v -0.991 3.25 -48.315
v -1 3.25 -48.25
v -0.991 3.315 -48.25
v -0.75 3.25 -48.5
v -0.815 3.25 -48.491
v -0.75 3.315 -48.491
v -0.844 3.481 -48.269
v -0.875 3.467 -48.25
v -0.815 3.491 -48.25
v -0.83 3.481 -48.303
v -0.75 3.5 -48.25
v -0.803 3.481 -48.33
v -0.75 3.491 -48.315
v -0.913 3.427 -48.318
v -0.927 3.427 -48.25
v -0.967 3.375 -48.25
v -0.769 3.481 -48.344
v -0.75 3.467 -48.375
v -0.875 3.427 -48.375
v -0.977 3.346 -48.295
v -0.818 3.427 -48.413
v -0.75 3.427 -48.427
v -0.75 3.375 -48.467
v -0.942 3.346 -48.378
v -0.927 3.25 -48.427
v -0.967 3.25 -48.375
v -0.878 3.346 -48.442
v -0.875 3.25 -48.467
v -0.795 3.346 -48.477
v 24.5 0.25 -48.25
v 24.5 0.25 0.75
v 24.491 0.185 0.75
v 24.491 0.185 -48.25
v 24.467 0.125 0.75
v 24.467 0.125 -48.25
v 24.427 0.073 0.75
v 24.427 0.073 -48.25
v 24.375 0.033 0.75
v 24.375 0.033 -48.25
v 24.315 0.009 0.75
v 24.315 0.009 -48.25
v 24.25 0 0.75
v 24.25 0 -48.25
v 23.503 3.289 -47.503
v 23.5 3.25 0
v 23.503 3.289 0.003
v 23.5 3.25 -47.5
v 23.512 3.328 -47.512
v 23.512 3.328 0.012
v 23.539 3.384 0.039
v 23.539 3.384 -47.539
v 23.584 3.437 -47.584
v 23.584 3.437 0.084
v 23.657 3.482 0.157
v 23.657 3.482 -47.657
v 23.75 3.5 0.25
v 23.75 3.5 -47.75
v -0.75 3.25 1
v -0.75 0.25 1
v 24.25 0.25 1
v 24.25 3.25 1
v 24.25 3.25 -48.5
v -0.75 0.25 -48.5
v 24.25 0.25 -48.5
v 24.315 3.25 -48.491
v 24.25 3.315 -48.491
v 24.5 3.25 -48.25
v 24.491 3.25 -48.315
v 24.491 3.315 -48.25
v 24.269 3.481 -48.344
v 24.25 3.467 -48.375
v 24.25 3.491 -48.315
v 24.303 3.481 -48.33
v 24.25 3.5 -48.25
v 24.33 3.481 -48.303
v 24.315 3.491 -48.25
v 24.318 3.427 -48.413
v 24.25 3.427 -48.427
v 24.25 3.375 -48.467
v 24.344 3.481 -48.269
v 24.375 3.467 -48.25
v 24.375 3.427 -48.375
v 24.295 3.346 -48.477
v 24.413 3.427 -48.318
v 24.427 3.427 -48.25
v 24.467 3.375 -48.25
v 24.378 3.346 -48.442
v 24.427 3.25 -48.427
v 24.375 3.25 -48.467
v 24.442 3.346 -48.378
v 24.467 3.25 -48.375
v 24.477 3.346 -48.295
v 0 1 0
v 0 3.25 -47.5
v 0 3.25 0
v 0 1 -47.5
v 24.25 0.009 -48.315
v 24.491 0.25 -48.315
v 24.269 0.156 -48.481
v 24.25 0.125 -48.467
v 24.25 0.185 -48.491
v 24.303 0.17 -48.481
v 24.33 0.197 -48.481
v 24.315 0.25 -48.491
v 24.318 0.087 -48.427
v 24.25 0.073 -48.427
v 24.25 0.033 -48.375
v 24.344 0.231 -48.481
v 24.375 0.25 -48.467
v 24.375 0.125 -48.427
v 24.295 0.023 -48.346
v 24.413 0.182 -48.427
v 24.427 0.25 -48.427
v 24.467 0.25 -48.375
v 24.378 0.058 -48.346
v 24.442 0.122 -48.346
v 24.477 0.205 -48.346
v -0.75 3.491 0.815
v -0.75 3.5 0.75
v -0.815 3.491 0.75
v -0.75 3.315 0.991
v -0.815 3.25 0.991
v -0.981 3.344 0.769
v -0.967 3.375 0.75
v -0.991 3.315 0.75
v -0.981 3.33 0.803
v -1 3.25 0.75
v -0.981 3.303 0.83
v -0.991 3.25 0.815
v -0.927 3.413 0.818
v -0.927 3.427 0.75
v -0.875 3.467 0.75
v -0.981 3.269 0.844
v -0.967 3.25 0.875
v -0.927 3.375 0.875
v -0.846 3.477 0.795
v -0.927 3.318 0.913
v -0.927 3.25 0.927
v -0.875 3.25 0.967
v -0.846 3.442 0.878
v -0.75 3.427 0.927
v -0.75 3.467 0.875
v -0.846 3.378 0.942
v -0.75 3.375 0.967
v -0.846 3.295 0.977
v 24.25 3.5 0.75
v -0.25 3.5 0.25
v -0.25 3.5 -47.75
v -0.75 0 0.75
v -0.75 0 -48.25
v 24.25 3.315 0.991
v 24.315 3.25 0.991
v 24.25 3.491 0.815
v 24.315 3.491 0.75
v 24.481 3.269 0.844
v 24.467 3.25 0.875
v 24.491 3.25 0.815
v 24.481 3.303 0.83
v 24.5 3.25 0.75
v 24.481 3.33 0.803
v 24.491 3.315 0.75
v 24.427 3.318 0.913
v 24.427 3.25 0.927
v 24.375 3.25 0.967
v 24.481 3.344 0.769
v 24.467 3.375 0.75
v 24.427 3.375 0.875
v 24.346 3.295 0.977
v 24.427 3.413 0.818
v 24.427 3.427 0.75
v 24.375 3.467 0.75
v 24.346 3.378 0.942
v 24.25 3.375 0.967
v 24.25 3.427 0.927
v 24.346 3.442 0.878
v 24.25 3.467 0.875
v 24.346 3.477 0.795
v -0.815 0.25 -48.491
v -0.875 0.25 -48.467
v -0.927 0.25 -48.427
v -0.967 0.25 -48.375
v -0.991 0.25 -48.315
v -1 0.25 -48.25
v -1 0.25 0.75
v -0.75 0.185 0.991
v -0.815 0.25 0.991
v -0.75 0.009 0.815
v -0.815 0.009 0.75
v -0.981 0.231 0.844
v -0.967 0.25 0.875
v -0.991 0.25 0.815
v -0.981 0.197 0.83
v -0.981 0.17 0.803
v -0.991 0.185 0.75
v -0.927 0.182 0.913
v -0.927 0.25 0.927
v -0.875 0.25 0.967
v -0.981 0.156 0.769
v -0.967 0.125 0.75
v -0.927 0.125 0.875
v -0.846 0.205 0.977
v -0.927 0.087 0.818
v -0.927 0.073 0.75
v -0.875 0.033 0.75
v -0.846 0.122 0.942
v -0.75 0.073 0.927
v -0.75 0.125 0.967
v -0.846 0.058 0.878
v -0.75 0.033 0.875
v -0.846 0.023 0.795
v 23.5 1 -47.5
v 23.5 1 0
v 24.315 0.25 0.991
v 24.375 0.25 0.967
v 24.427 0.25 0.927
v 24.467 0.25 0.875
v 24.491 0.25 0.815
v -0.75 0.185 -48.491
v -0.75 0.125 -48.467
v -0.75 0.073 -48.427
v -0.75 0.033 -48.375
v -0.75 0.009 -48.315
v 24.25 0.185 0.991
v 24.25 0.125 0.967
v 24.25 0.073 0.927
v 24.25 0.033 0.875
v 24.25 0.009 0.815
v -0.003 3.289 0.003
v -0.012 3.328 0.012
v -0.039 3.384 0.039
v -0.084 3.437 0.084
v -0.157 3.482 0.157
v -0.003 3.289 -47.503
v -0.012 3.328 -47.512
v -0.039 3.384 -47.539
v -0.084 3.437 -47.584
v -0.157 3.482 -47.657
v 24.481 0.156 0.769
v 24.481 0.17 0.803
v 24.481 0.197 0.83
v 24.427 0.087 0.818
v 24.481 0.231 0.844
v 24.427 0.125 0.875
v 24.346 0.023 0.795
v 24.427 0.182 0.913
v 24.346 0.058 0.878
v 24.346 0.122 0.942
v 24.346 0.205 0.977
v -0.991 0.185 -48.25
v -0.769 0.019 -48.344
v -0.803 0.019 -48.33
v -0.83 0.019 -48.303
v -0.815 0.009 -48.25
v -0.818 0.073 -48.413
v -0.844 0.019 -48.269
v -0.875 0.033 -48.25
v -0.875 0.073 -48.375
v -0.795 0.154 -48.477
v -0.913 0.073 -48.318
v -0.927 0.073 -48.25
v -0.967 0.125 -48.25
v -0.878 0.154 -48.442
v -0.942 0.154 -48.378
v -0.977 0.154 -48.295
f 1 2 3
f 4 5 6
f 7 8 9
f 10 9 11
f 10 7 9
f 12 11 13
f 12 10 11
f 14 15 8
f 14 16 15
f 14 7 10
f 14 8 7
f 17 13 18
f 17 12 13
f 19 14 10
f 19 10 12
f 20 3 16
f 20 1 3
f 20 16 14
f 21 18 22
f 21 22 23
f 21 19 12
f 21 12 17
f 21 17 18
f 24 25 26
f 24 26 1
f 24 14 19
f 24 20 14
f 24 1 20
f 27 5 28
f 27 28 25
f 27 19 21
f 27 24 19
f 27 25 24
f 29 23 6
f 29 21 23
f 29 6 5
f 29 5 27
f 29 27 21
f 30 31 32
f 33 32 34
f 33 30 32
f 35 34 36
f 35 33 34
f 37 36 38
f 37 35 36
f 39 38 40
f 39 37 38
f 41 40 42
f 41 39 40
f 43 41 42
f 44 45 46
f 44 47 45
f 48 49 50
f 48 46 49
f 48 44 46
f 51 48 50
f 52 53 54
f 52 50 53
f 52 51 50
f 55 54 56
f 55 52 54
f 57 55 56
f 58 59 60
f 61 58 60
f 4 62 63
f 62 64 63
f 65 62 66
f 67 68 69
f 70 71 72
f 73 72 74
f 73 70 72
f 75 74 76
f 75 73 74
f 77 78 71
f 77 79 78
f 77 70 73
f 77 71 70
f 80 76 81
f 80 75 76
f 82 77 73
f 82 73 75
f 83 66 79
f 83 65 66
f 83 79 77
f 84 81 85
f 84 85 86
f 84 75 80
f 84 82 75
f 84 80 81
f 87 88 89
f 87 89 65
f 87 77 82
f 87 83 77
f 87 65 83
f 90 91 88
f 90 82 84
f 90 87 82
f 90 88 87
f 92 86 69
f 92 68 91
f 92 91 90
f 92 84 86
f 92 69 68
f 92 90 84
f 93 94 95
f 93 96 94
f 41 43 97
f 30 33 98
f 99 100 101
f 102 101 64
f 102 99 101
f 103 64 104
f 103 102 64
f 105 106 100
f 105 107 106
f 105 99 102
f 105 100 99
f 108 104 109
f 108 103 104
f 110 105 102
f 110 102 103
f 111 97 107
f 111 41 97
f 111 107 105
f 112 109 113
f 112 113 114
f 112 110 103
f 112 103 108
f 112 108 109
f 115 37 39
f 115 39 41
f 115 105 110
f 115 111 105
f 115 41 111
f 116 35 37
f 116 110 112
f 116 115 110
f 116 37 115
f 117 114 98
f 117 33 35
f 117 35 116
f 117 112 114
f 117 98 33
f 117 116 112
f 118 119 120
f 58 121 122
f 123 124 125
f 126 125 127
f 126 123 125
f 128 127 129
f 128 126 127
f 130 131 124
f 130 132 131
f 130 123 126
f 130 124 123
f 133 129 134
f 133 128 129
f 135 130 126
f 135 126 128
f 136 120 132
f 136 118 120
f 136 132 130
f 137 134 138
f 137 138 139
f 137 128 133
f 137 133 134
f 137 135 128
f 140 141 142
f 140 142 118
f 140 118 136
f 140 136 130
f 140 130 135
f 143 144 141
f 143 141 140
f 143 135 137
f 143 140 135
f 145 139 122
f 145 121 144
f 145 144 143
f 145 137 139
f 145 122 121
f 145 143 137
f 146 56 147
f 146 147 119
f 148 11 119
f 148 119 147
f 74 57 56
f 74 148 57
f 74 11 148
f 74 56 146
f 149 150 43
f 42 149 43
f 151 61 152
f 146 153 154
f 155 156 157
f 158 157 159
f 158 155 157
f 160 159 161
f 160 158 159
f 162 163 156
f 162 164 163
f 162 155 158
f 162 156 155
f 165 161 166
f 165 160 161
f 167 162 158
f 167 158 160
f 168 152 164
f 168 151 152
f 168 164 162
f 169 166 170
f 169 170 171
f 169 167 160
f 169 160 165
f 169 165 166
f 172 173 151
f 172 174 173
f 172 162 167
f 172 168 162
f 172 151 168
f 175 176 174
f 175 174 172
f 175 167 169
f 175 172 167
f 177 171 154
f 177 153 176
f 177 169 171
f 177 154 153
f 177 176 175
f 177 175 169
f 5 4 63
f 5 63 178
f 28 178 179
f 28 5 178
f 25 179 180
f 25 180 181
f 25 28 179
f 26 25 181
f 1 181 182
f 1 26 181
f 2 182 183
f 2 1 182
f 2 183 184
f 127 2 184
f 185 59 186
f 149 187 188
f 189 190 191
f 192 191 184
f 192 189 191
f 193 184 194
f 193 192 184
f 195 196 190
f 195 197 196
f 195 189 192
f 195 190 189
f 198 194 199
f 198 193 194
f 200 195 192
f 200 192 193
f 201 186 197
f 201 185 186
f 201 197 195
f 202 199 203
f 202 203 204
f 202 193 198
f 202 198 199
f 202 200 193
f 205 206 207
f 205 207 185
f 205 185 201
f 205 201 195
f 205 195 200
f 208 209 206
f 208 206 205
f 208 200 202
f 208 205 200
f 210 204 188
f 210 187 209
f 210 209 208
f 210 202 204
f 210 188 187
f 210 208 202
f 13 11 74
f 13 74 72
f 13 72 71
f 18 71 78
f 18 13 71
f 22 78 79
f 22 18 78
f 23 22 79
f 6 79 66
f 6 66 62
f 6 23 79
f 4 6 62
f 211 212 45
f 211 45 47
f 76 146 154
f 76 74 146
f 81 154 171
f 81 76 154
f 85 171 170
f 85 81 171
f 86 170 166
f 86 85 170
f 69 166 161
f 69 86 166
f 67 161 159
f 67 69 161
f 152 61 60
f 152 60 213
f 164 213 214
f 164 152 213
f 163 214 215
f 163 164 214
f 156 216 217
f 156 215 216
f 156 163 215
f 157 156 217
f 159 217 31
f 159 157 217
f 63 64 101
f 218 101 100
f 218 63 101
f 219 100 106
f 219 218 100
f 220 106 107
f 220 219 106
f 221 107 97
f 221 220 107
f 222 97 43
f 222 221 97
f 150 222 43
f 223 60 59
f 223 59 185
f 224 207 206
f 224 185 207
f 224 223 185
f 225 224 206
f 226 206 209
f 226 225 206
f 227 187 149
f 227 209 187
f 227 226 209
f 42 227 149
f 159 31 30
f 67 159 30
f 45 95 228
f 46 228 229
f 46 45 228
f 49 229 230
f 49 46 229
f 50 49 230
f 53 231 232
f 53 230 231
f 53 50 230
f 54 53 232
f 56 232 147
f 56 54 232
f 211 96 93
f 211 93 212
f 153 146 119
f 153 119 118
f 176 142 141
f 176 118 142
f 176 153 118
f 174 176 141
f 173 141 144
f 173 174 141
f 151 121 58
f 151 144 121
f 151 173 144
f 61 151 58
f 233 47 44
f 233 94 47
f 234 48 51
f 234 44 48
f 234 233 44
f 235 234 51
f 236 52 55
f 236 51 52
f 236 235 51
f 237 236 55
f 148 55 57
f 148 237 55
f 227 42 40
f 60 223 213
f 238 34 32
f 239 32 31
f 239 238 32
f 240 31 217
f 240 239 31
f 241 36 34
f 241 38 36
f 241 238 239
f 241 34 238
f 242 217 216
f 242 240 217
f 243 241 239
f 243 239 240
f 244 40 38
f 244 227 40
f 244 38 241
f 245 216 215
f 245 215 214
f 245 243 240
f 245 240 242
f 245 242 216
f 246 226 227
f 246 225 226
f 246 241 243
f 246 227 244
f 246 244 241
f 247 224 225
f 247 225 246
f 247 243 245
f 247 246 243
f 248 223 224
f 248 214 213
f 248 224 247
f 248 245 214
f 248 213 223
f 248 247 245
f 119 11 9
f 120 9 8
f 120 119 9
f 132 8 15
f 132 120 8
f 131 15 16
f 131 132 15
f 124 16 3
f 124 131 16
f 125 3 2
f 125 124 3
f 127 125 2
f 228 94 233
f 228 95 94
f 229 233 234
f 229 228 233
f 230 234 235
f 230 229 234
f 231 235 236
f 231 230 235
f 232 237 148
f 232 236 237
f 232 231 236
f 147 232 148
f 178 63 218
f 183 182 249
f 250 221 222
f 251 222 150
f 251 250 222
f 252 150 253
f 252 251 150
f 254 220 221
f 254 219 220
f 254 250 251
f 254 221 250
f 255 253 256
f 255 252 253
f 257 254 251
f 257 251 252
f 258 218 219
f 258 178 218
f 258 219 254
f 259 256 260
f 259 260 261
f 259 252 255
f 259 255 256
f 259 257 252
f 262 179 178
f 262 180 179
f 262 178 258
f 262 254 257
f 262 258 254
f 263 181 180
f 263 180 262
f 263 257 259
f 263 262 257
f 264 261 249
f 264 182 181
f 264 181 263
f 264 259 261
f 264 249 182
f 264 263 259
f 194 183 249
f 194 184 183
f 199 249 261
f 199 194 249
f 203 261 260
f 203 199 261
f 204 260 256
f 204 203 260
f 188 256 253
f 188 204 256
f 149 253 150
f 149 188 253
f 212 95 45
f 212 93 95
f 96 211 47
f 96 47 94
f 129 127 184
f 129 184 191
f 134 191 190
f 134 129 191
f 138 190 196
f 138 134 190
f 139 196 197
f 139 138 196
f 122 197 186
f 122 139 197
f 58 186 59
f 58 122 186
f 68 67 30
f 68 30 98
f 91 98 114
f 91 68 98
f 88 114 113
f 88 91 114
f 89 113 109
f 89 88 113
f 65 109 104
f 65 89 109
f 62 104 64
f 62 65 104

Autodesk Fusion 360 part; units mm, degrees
sketch "Sketch1" plane through (0, 0, 0) normal (0, 1, 0) x (1, 0, 0)
  line L0 (0, 0) -> (23.5, 0)
  line L1 (23.5, 0) -> (23.5, 47.5)
  line L2 (23.5, 47.5) -> (0, 47.5)
  line L3 (0, 47.5) -> (0, 0)
  line L4 (-1, -1) -> (24.5, -1)
  line L5 (24.5, -1) -> (24.5, 48.5)
  line L6 (24.5, 48.5) -> (-1, 48.5)
  line L7 (-1, 48.5) -> (-1, -1)
  dimension "d1" = 23.5
  dimension "d2" = 47.5
  dimension "d3" = 1
extrude "Extrude1" add sketch "Sketch1" along normal blind 1 contours L0 L1 L2 L3
extrude "Extrude2" add sketch "Sketch1" along normal blind 3.5
fillet "Fillet1" radius 0.25 7 edges at (11.75, 0, 1) (24.5, 0, -23.75) (11.75, 3.5, 1) (0, 3.5, -23.75) (11.75, 3.5, -47.5) (23.5, 3.5, -23.75) (11.75, 3.5, 0) 4 faces at (24.5, 1.1667, -15.5) (16, 1.1667, -48.5) (7.5, 0, -32) (-1, 1.1667, -32)
